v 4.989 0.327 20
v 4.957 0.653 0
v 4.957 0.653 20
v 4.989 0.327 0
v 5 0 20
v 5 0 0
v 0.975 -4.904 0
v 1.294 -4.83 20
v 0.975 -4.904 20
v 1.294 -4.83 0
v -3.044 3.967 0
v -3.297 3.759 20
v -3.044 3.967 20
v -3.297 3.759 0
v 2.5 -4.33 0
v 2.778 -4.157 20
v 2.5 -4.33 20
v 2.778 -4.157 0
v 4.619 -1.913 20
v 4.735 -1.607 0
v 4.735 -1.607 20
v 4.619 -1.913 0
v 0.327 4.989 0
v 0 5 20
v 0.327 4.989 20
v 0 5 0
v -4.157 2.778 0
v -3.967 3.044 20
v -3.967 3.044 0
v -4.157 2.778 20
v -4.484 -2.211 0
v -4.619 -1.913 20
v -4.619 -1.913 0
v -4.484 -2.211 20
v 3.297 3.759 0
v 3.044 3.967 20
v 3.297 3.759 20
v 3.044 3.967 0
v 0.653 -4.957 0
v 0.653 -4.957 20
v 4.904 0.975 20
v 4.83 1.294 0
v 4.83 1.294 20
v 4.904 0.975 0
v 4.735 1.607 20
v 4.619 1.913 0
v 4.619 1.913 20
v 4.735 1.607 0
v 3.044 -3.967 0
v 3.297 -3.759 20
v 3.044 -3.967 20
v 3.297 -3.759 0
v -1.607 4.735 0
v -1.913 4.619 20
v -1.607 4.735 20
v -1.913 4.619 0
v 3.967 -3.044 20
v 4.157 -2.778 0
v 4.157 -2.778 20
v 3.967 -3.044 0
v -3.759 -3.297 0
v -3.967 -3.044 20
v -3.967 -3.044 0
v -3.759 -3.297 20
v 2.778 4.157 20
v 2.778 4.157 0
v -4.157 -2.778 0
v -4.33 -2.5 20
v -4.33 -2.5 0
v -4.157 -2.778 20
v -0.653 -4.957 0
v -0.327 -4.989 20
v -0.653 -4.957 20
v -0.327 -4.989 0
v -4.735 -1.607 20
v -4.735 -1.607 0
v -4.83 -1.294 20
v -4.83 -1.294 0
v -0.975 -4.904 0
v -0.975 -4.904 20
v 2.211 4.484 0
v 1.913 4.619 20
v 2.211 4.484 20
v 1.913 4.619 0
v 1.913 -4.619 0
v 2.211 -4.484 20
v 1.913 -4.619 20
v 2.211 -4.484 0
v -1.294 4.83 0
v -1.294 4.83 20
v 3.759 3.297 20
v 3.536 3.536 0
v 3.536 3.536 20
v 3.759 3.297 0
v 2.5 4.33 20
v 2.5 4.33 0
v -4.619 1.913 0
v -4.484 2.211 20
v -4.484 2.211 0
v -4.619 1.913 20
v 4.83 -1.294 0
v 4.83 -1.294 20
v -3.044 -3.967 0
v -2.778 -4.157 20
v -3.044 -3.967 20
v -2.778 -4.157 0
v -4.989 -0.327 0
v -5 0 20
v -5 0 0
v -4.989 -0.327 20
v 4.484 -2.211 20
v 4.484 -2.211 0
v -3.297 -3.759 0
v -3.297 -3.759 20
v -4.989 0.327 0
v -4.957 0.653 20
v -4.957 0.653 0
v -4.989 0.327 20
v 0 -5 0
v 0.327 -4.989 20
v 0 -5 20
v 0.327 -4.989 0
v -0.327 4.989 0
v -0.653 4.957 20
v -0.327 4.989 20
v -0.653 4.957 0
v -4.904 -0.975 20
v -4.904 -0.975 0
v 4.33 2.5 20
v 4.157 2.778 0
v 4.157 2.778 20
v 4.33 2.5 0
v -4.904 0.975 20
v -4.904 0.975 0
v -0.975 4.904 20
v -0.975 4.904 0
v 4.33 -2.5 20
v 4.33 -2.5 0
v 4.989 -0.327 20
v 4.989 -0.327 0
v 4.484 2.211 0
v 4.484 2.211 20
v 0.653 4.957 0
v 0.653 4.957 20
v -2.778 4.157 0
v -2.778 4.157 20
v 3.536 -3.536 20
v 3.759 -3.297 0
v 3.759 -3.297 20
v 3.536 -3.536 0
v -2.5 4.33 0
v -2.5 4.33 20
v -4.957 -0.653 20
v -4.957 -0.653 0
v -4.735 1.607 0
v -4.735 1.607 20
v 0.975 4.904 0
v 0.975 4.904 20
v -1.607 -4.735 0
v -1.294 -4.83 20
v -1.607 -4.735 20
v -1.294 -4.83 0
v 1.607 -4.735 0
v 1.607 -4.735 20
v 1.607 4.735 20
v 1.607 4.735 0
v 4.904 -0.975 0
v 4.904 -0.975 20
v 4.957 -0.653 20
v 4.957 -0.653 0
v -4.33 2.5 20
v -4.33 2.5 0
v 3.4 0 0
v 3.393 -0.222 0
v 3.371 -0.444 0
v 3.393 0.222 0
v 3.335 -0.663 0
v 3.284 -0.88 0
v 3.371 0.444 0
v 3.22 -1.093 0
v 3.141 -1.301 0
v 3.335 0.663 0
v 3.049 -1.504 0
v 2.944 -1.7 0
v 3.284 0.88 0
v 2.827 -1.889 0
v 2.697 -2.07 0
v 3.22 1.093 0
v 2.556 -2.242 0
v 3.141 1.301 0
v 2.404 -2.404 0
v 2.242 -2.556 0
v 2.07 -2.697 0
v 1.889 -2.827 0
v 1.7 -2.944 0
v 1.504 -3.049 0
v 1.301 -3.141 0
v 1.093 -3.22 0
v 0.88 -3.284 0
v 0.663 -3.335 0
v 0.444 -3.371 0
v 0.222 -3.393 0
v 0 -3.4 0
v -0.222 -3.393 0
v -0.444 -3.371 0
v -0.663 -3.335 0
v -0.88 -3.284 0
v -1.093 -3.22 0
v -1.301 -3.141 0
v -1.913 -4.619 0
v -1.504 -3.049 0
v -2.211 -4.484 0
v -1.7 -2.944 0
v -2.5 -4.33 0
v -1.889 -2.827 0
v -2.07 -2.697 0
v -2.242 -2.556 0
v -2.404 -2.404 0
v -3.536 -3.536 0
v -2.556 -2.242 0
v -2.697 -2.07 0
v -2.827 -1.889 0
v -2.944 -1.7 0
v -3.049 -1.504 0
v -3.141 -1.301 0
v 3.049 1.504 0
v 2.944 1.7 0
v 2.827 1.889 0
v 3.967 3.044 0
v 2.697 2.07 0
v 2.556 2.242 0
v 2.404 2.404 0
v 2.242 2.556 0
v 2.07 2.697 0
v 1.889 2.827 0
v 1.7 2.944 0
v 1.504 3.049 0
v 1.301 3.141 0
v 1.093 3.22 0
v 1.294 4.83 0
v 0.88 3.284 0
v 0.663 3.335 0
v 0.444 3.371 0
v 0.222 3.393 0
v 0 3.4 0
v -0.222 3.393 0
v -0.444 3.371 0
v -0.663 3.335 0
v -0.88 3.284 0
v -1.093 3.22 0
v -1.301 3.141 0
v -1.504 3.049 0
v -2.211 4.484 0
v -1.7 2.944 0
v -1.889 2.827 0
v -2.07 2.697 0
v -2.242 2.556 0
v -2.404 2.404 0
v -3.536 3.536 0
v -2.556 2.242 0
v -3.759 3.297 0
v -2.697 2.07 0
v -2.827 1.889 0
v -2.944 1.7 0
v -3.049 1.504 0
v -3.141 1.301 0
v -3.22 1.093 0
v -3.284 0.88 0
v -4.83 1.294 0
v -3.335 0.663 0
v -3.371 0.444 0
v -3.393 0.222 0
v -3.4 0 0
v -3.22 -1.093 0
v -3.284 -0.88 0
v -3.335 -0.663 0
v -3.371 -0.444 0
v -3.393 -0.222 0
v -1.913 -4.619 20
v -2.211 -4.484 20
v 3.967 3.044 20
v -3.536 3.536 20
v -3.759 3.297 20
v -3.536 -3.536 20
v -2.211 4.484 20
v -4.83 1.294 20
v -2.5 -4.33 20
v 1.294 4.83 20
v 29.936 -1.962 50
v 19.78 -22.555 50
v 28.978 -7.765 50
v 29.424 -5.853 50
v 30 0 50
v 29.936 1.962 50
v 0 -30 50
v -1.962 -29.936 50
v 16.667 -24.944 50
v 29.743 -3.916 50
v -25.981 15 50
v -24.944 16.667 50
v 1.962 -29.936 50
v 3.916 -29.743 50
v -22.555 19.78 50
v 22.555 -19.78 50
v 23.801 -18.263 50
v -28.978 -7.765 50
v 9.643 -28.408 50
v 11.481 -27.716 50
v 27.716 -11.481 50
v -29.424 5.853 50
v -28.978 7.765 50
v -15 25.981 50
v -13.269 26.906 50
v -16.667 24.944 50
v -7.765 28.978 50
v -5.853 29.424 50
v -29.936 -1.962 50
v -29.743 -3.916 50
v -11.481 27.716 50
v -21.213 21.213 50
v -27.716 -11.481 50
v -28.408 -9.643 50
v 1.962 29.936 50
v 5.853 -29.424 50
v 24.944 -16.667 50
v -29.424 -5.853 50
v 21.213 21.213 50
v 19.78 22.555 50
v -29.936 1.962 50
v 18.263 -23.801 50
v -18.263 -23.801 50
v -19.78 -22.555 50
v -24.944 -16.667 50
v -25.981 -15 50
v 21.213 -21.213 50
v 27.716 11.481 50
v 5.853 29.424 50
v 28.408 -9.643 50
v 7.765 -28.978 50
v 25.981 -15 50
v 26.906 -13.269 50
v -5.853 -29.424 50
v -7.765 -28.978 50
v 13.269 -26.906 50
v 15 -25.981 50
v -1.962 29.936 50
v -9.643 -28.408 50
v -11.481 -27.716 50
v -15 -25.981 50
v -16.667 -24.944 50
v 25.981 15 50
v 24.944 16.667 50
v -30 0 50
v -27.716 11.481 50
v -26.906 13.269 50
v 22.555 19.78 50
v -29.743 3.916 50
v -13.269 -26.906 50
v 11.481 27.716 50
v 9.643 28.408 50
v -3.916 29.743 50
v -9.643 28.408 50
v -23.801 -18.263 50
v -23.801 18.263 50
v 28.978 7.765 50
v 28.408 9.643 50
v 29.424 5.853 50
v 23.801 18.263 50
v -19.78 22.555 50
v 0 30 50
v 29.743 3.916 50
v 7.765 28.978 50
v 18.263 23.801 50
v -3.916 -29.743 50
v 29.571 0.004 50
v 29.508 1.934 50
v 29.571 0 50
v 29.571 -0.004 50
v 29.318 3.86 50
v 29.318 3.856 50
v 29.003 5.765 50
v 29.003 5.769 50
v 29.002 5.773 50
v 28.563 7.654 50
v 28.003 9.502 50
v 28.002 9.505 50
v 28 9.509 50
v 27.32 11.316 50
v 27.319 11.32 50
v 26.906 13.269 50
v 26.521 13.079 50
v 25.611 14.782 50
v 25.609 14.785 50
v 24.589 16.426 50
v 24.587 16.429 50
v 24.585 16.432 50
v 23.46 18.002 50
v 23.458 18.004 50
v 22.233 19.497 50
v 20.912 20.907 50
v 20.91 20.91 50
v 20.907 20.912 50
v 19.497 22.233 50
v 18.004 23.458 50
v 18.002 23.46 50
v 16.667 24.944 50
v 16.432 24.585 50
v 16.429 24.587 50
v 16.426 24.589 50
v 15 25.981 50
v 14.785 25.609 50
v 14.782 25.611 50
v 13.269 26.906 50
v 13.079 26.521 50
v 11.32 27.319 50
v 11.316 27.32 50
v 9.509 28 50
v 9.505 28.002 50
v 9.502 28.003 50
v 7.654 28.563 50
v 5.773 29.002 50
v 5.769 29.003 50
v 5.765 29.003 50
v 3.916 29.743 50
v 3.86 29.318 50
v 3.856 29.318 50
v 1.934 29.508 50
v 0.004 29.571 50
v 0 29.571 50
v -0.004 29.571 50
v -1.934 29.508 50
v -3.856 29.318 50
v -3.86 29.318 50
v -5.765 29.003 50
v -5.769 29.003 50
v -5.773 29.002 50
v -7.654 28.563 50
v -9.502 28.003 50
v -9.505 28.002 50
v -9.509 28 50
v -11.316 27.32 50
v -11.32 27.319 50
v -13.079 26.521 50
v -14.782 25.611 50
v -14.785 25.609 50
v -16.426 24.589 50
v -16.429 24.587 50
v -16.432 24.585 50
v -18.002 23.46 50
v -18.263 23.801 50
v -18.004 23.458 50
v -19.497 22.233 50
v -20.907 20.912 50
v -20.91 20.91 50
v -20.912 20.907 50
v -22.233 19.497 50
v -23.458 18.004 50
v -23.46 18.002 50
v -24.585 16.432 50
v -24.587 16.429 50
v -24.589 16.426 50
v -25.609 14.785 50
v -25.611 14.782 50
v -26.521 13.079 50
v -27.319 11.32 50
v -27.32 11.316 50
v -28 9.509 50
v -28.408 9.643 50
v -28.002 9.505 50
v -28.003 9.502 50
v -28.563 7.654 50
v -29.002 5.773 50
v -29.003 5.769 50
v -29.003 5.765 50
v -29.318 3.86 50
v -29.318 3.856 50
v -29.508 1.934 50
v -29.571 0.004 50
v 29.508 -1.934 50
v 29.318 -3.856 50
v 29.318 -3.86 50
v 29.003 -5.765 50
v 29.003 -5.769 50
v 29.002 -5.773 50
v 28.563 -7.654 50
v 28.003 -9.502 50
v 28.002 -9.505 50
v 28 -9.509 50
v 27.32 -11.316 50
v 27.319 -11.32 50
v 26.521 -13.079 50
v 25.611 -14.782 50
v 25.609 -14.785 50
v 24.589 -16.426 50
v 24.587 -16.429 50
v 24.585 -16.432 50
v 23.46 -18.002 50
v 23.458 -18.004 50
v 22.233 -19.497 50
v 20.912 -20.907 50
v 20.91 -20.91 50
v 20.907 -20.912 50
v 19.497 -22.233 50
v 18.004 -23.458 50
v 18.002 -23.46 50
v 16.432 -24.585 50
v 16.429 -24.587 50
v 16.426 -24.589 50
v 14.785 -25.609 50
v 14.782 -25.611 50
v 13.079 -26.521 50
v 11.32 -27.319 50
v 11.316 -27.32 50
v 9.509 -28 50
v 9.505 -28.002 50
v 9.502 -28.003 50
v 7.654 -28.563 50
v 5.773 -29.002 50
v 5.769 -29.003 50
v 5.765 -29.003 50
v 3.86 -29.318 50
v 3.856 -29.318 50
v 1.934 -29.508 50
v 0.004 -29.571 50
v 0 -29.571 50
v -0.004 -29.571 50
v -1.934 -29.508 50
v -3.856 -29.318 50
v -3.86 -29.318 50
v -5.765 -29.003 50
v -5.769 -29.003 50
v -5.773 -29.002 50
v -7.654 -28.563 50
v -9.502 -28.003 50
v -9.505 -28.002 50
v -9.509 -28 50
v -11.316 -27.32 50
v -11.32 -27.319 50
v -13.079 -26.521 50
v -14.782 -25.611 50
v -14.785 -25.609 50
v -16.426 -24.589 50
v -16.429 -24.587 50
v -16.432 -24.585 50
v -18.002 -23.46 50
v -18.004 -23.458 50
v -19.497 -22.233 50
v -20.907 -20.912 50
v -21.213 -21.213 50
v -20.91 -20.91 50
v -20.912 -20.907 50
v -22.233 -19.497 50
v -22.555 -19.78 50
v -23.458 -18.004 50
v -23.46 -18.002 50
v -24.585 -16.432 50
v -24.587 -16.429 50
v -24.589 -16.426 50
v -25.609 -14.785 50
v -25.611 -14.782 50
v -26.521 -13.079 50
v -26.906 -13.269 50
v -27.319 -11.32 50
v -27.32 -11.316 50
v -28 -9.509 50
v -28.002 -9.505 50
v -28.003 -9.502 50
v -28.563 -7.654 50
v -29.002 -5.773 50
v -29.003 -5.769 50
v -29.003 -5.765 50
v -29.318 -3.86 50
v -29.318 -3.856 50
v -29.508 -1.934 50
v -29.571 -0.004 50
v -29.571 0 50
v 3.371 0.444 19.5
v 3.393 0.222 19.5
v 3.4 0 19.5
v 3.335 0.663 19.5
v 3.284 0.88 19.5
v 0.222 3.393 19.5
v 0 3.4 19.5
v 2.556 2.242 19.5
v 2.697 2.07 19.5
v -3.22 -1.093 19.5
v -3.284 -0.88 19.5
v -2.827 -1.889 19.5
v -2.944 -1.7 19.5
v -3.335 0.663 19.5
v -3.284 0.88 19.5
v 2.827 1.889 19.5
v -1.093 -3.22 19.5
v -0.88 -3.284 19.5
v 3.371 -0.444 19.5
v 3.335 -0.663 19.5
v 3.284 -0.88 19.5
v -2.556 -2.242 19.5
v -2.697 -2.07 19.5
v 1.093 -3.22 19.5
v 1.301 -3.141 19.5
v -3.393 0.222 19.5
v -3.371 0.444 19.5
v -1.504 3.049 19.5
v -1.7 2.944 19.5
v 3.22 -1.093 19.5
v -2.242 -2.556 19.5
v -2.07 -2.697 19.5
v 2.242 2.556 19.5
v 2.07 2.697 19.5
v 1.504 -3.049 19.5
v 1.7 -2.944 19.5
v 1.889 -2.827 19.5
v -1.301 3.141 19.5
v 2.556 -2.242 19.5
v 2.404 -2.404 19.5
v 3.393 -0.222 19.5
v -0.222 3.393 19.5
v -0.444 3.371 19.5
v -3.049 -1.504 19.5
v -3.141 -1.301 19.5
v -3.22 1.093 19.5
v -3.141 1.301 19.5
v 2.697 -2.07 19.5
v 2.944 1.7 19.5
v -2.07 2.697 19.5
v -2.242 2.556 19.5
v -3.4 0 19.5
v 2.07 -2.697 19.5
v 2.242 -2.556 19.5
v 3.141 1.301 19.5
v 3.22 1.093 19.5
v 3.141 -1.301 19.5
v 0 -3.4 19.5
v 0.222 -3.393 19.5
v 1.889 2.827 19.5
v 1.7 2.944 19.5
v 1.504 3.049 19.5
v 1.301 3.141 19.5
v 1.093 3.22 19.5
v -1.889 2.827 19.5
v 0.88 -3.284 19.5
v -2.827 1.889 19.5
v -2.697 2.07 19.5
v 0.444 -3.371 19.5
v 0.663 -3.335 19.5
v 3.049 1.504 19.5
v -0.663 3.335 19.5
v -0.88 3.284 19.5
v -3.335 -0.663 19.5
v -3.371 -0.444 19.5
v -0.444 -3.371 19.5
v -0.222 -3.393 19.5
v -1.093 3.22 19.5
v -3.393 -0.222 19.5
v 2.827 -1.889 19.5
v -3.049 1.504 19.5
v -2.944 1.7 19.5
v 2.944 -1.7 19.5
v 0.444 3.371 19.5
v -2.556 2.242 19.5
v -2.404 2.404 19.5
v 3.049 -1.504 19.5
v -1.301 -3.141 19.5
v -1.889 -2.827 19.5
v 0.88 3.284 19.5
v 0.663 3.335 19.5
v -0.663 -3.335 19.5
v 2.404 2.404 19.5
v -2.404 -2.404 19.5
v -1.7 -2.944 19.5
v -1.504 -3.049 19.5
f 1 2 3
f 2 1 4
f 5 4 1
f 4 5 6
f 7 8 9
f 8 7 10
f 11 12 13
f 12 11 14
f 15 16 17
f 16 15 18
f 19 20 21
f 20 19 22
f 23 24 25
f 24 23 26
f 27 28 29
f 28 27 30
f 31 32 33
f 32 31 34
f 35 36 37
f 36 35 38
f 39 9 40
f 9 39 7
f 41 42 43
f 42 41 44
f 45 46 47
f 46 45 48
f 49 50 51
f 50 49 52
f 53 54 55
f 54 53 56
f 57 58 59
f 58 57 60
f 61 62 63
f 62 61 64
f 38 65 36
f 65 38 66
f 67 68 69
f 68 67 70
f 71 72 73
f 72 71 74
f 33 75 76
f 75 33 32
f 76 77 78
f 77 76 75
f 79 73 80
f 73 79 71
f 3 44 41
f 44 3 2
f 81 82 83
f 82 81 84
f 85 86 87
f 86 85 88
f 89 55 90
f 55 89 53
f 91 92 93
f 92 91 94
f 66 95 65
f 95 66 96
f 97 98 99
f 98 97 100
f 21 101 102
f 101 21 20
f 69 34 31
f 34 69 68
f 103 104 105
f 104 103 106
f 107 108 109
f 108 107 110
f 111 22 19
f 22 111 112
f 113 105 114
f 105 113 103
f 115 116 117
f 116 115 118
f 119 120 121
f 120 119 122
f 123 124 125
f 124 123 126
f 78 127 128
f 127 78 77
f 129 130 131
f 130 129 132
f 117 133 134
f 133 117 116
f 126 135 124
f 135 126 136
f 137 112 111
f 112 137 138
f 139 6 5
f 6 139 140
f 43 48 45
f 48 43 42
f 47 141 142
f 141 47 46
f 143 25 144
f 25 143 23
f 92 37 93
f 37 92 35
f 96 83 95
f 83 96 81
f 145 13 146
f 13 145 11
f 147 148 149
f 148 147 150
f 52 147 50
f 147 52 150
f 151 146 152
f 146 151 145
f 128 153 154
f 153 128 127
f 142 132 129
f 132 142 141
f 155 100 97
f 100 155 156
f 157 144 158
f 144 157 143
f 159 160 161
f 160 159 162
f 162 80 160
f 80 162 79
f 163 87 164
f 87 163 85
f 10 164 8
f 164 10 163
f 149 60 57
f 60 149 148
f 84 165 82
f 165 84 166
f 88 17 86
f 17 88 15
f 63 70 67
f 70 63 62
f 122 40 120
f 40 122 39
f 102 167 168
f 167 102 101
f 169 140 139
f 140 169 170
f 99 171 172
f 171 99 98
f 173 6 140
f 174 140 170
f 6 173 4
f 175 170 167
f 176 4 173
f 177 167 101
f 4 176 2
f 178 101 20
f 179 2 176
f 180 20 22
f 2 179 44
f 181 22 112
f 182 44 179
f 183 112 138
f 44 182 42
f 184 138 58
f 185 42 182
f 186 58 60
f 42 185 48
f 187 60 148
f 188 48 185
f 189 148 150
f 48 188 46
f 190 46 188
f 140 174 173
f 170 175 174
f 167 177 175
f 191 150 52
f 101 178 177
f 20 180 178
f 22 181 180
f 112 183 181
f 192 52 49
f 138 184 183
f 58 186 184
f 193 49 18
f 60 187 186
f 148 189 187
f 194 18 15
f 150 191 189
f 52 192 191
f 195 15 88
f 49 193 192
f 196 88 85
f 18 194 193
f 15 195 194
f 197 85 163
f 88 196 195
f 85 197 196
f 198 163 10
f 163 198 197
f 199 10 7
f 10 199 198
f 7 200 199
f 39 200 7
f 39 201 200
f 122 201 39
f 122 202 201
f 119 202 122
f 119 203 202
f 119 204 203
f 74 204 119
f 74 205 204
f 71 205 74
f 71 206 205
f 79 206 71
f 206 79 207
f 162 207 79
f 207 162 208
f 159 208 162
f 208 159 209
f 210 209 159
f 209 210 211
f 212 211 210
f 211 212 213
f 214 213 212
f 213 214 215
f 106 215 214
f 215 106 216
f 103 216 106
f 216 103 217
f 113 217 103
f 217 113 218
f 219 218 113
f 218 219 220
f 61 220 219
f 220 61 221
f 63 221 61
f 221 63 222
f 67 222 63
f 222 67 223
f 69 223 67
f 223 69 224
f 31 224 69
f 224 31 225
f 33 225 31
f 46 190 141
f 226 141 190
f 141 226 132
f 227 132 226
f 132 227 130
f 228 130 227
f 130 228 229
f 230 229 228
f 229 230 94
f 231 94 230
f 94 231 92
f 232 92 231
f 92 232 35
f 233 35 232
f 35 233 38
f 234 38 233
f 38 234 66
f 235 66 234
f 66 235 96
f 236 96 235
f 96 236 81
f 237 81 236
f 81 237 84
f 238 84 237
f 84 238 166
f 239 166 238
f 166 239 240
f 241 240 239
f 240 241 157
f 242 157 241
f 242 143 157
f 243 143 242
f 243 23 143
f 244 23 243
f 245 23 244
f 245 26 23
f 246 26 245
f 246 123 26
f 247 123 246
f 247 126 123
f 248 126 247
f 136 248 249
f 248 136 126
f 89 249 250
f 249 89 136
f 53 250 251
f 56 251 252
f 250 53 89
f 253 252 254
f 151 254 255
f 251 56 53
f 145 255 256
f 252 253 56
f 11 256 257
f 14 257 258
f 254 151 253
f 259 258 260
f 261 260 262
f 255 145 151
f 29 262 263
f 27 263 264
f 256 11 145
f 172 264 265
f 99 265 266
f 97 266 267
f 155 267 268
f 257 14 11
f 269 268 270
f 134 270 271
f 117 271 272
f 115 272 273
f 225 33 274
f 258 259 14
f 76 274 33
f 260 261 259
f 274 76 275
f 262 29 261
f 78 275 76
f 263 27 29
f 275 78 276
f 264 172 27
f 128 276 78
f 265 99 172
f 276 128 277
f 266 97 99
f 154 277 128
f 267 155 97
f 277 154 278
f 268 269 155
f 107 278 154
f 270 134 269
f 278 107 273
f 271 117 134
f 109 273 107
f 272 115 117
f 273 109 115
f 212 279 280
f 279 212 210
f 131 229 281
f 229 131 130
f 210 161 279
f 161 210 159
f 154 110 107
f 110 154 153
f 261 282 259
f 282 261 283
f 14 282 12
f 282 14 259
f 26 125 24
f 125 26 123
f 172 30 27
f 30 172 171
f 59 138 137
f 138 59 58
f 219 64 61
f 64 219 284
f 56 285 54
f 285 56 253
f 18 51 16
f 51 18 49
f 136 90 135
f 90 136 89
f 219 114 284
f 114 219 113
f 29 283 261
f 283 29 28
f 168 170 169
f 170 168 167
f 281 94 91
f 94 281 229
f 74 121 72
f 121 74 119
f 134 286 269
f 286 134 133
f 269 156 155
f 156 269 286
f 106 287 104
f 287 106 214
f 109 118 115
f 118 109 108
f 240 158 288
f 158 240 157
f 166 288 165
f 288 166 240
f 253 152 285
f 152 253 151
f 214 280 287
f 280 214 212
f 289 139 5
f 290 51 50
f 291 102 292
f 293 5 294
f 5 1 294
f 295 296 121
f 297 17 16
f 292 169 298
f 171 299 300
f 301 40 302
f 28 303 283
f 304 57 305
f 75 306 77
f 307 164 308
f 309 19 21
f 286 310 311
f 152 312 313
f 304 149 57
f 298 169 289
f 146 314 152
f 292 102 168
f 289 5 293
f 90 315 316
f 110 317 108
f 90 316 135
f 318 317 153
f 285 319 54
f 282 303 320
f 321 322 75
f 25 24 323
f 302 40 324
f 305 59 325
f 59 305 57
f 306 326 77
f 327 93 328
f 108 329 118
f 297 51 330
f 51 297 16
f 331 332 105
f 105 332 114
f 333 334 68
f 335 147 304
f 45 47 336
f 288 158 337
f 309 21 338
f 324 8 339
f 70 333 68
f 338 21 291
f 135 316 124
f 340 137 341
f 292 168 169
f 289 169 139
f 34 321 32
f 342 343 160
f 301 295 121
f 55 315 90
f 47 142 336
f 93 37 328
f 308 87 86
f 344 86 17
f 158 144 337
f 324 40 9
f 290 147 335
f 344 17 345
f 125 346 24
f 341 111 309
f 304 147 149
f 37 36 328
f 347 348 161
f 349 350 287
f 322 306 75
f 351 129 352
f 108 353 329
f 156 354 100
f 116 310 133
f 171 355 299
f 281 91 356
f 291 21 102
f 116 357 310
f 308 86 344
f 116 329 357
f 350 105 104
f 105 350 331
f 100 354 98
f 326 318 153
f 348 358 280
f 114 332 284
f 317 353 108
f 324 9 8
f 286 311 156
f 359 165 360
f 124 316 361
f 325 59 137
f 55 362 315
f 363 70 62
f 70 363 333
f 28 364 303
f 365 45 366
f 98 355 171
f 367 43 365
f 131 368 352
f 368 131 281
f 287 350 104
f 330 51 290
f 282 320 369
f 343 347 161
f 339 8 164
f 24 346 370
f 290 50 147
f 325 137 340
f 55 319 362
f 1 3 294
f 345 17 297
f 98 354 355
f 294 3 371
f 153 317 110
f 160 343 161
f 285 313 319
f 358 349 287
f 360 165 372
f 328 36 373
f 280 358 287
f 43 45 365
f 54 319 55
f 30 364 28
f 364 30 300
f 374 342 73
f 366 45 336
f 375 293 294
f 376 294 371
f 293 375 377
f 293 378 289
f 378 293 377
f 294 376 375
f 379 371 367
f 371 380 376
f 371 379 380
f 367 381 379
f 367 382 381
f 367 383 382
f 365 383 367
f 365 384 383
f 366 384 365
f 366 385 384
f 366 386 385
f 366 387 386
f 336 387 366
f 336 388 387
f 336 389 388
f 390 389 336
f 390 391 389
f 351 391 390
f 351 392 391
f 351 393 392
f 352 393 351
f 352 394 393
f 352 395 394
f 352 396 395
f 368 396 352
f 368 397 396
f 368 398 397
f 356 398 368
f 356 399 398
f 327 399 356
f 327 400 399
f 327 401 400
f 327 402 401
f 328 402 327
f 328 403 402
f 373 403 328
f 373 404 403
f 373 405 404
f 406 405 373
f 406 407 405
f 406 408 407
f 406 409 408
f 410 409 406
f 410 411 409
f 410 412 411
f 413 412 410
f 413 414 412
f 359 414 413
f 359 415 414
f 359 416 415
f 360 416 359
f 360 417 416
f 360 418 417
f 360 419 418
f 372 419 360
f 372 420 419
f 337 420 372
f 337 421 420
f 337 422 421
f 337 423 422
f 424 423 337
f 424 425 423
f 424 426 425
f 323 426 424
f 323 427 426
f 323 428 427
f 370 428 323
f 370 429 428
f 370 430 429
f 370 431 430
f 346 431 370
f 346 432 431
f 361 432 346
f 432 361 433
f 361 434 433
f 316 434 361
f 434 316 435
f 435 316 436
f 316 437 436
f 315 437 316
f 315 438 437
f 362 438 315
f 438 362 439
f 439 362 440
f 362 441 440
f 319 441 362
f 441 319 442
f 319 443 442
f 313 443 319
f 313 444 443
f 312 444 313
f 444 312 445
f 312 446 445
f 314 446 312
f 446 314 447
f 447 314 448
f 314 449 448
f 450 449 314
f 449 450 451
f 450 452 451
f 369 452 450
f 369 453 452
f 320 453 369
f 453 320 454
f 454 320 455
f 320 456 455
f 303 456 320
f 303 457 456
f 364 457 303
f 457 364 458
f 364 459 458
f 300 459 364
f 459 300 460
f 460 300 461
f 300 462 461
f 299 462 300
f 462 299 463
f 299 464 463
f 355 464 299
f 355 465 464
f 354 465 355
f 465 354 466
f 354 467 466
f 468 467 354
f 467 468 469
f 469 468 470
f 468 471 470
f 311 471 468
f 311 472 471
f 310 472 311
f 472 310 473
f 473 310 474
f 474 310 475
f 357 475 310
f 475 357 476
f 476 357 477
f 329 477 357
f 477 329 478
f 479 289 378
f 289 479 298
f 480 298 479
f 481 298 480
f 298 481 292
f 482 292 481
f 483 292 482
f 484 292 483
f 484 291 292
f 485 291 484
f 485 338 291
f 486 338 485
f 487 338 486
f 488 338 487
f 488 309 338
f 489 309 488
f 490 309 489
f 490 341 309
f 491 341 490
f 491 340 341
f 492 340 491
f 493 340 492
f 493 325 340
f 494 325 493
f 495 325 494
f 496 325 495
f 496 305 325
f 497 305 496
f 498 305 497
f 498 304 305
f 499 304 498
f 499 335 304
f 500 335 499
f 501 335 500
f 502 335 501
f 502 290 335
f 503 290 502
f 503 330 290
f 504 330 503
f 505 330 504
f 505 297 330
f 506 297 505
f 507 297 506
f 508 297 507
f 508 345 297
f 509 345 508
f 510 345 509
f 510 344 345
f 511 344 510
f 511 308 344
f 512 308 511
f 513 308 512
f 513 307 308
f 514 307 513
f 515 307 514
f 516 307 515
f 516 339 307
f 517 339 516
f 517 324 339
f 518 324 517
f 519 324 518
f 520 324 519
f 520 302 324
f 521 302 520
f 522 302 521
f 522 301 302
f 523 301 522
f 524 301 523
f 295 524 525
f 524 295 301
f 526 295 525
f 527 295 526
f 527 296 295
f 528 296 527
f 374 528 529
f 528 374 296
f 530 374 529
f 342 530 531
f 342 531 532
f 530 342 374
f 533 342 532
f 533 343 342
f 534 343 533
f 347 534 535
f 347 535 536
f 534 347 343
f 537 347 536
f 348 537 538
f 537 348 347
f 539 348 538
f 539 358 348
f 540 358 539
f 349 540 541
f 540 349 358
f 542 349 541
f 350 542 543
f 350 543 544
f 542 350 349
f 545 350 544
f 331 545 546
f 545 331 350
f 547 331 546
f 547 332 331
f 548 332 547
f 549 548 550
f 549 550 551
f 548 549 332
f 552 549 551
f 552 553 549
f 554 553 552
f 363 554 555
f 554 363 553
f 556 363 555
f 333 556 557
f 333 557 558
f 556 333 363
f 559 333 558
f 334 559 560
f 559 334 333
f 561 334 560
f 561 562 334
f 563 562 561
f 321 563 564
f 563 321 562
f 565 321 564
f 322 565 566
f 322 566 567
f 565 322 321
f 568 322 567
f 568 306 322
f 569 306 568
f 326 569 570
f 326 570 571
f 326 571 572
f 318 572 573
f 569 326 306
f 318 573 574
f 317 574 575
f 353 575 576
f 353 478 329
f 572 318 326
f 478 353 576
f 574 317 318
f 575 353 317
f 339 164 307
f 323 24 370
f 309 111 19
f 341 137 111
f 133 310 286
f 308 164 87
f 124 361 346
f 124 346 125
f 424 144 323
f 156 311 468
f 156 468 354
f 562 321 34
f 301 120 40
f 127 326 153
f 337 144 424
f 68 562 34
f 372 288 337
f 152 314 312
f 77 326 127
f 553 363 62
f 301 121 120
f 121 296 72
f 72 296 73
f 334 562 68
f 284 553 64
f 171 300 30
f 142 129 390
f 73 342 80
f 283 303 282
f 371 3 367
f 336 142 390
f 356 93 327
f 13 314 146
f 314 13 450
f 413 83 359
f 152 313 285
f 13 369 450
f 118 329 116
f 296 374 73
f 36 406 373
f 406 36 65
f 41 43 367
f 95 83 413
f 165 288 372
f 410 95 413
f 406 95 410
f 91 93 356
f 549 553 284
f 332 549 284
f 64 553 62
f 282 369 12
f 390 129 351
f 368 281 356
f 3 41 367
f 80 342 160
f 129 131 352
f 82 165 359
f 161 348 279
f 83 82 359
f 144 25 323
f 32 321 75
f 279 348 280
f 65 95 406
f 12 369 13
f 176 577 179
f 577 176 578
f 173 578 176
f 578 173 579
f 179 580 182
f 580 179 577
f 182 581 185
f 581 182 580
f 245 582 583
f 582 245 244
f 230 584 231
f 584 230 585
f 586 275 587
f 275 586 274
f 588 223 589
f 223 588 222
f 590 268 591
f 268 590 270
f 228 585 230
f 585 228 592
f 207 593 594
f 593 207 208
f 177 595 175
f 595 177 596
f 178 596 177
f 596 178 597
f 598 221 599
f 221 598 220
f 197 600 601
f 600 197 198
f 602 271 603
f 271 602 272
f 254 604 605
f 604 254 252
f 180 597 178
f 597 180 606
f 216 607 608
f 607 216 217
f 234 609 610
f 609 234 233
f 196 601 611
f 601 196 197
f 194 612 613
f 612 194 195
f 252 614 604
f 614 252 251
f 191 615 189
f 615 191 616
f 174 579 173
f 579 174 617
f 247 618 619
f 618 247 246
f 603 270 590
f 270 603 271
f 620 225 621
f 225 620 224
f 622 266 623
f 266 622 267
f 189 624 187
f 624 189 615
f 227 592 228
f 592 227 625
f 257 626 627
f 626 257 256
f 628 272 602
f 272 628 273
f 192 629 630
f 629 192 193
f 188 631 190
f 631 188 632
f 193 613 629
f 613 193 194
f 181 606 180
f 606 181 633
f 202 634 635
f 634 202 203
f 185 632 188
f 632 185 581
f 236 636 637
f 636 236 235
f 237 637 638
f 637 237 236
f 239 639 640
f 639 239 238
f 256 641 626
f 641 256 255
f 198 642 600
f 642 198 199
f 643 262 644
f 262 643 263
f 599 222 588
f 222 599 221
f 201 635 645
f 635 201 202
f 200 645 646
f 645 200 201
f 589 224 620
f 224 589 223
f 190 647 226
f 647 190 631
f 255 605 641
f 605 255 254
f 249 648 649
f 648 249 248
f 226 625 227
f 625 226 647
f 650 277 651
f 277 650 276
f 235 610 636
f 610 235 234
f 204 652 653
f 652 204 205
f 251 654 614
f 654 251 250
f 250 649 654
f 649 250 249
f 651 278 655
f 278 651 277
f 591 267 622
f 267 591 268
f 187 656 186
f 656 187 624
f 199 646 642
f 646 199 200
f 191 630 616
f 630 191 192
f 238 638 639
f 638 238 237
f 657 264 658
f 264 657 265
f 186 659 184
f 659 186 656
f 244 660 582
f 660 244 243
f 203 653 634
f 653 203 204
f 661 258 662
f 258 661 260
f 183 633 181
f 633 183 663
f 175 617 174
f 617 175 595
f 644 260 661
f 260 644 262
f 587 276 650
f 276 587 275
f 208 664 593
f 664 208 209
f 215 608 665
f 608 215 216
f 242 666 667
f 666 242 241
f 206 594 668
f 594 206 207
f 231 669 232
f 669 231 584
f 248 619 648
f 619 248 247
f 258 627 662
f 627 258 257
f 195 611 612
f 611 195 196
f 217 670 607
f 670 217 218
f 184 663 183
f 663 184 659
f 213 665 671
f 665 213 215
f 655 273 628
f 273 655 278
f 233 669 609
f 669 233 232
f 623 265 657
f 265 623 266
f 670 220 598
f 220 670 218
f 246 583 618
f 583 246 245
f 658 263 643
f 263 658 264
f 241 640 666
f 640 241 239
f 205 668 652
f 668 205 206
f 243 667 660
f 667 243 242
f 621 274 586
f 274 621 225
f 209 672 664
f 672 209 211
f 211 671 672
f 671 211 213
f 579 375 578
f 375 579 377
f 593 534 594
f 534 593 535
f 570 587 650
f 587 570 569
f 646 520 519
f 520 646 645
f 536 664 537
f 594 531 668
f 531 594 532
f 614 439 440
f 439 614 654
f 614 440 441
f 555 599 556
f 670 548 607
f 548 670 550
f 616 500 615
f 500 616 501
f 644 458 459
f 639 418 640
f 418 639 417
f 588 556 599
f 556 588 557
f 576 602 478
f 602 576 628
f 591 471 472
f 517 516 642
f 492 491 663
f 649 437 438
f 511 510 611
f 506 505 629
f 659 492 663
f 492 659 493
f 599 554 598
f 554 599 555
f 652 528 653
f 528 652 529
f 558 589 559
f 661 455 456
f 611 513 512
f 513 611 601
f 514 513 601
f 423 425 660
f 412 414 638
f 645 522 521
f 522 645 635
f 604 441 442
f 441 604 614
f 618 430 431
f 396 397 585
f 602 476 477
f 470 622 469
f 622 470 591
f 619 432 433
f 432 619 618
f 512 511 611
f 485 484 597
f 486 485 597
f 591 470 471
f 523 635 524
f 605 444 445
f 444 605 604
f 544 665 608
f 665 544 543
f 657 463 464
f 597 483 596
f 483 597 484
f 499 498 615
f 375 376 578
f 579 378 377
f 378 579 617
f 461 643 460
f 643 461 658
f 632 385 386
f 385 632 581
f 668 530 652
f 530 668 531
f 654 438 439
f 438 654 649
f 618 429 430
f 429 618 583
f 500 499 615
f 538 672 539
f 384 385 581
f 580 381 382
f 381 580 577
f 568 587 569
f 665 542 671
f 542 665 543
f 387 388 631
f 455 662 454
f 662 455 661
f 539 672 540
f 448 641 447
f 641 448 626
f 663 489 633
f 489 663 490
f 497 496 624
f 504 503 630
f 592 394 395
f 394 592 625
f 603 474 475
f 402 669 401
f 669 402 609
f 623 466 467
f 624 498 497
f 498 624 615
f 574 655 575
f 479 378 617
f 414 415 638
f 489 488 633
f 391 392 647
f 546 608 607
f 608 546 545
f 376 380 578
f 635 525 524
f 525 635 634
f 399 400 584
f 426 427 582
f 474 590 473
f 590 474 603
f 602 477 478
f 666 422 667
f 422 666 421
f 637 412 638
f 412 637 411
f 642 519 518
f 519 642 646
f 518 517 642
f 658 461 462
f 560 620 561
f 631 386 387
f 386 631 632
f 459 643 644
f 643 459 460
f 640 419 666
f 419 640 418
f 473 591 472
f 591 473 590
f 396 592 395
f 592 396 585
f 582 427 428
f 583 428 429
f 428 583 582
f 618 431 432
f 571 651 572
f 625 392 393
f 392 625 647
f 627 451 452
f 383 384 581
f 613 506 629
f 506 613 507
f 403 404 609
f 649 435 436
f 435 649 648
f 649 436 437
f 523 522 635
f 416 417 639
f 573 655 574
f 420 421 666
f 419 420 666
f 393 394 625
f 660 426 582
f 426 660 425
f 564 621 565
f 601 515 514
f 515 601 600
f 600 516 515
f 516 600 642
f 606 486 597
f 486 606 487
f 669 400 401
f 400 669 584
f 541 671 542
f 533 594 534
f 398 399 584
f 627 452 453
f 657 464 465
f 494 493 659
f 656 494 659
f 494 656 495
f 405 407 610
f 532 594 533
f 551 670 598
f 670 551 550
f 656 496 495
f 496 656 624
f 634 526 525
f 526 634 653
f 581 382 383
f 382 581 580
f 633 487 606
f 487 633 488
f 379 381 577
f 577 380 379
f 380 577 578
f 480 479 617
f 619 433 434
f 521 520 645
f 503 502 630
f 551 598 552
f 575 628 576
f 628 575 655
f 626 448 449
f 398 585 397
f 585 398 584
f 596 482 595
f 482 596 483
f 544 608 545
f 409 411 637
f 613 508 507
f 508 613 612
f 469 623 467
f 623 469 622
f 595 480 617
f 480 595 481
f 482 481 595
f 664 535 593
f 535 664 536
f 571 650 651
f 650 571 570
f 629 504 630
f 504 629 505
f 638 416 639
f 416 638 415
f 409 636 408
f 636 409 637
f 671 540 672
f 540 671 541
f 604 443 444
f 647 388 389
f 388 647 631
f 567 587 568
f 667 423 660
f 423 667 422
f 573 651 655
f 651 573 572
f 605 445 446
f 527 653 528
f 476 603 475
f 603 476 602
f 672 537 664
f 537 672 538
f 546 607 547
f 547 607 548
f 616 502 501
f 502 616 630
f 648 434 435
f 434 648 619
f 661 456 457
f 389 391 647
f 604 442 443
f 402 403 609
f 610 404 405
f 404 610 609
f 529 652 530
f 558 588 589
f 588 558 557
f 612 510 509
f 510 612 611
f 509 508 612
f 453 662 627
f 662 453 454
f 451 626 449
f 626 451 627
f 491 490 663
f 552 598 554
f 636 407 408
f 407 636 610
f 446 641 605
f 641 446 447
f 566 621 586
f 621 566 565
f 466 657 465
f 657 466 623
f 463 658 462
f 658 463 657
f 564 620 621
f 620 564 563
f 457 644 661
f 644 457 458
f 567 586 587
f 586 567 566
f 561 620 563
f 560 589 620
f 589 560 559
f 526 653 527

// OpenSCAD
// Lab funnel - printed upright, open at top and bottom
// Units: mm

// ---- Parameters ----
spout_od      = 10;    // spout outer diameter
spout_h       = 20;    // spout height (z = 0 to 20)
cone_bottom_d = 10;    // cone outer diameter at spout junction (z = 20)
cone_top_d    = 60;    // cone outer diameter at rim (z = 50)
cone_top_z    = 50;    // rim height
wall          = 1.6;   // wall thickness everywhere
eps           = 0.5;   // cutter overshoot past faces

$fn = 96;

// ---- Derived ----
spout_id = spout_od - 2 * wall;   // 6.8 mm bore
// cone runs from z = spout_h to z = cone_top_z

// ---- Model ----
difference() {
    union() {
        // Spout (tube)
        cylinder(d = spout_od, h = spout_h);
        // Cone (frustum)
        translate([0, 0, spout_h])
            cylinder(d1 = cone_bottom_d, d2 = cone_top_d, h = cone_top_z - spout_h);
    }
    // Bottom cutter (opens spout bore through z = 0)
    translate([0, 0, -eps])
        cylinder(d = spout_id, h = spout_h + 2 * eps);
    // Cone cutter (opens funnel from bore at z = 20 to rim at z = 50)
    translate([0, 0, spout_h - eps])
        cylinder(d1 = spout_id, d2 = cone_top_d, h = cone_top_z - spout_h + 2 * eps);
}
